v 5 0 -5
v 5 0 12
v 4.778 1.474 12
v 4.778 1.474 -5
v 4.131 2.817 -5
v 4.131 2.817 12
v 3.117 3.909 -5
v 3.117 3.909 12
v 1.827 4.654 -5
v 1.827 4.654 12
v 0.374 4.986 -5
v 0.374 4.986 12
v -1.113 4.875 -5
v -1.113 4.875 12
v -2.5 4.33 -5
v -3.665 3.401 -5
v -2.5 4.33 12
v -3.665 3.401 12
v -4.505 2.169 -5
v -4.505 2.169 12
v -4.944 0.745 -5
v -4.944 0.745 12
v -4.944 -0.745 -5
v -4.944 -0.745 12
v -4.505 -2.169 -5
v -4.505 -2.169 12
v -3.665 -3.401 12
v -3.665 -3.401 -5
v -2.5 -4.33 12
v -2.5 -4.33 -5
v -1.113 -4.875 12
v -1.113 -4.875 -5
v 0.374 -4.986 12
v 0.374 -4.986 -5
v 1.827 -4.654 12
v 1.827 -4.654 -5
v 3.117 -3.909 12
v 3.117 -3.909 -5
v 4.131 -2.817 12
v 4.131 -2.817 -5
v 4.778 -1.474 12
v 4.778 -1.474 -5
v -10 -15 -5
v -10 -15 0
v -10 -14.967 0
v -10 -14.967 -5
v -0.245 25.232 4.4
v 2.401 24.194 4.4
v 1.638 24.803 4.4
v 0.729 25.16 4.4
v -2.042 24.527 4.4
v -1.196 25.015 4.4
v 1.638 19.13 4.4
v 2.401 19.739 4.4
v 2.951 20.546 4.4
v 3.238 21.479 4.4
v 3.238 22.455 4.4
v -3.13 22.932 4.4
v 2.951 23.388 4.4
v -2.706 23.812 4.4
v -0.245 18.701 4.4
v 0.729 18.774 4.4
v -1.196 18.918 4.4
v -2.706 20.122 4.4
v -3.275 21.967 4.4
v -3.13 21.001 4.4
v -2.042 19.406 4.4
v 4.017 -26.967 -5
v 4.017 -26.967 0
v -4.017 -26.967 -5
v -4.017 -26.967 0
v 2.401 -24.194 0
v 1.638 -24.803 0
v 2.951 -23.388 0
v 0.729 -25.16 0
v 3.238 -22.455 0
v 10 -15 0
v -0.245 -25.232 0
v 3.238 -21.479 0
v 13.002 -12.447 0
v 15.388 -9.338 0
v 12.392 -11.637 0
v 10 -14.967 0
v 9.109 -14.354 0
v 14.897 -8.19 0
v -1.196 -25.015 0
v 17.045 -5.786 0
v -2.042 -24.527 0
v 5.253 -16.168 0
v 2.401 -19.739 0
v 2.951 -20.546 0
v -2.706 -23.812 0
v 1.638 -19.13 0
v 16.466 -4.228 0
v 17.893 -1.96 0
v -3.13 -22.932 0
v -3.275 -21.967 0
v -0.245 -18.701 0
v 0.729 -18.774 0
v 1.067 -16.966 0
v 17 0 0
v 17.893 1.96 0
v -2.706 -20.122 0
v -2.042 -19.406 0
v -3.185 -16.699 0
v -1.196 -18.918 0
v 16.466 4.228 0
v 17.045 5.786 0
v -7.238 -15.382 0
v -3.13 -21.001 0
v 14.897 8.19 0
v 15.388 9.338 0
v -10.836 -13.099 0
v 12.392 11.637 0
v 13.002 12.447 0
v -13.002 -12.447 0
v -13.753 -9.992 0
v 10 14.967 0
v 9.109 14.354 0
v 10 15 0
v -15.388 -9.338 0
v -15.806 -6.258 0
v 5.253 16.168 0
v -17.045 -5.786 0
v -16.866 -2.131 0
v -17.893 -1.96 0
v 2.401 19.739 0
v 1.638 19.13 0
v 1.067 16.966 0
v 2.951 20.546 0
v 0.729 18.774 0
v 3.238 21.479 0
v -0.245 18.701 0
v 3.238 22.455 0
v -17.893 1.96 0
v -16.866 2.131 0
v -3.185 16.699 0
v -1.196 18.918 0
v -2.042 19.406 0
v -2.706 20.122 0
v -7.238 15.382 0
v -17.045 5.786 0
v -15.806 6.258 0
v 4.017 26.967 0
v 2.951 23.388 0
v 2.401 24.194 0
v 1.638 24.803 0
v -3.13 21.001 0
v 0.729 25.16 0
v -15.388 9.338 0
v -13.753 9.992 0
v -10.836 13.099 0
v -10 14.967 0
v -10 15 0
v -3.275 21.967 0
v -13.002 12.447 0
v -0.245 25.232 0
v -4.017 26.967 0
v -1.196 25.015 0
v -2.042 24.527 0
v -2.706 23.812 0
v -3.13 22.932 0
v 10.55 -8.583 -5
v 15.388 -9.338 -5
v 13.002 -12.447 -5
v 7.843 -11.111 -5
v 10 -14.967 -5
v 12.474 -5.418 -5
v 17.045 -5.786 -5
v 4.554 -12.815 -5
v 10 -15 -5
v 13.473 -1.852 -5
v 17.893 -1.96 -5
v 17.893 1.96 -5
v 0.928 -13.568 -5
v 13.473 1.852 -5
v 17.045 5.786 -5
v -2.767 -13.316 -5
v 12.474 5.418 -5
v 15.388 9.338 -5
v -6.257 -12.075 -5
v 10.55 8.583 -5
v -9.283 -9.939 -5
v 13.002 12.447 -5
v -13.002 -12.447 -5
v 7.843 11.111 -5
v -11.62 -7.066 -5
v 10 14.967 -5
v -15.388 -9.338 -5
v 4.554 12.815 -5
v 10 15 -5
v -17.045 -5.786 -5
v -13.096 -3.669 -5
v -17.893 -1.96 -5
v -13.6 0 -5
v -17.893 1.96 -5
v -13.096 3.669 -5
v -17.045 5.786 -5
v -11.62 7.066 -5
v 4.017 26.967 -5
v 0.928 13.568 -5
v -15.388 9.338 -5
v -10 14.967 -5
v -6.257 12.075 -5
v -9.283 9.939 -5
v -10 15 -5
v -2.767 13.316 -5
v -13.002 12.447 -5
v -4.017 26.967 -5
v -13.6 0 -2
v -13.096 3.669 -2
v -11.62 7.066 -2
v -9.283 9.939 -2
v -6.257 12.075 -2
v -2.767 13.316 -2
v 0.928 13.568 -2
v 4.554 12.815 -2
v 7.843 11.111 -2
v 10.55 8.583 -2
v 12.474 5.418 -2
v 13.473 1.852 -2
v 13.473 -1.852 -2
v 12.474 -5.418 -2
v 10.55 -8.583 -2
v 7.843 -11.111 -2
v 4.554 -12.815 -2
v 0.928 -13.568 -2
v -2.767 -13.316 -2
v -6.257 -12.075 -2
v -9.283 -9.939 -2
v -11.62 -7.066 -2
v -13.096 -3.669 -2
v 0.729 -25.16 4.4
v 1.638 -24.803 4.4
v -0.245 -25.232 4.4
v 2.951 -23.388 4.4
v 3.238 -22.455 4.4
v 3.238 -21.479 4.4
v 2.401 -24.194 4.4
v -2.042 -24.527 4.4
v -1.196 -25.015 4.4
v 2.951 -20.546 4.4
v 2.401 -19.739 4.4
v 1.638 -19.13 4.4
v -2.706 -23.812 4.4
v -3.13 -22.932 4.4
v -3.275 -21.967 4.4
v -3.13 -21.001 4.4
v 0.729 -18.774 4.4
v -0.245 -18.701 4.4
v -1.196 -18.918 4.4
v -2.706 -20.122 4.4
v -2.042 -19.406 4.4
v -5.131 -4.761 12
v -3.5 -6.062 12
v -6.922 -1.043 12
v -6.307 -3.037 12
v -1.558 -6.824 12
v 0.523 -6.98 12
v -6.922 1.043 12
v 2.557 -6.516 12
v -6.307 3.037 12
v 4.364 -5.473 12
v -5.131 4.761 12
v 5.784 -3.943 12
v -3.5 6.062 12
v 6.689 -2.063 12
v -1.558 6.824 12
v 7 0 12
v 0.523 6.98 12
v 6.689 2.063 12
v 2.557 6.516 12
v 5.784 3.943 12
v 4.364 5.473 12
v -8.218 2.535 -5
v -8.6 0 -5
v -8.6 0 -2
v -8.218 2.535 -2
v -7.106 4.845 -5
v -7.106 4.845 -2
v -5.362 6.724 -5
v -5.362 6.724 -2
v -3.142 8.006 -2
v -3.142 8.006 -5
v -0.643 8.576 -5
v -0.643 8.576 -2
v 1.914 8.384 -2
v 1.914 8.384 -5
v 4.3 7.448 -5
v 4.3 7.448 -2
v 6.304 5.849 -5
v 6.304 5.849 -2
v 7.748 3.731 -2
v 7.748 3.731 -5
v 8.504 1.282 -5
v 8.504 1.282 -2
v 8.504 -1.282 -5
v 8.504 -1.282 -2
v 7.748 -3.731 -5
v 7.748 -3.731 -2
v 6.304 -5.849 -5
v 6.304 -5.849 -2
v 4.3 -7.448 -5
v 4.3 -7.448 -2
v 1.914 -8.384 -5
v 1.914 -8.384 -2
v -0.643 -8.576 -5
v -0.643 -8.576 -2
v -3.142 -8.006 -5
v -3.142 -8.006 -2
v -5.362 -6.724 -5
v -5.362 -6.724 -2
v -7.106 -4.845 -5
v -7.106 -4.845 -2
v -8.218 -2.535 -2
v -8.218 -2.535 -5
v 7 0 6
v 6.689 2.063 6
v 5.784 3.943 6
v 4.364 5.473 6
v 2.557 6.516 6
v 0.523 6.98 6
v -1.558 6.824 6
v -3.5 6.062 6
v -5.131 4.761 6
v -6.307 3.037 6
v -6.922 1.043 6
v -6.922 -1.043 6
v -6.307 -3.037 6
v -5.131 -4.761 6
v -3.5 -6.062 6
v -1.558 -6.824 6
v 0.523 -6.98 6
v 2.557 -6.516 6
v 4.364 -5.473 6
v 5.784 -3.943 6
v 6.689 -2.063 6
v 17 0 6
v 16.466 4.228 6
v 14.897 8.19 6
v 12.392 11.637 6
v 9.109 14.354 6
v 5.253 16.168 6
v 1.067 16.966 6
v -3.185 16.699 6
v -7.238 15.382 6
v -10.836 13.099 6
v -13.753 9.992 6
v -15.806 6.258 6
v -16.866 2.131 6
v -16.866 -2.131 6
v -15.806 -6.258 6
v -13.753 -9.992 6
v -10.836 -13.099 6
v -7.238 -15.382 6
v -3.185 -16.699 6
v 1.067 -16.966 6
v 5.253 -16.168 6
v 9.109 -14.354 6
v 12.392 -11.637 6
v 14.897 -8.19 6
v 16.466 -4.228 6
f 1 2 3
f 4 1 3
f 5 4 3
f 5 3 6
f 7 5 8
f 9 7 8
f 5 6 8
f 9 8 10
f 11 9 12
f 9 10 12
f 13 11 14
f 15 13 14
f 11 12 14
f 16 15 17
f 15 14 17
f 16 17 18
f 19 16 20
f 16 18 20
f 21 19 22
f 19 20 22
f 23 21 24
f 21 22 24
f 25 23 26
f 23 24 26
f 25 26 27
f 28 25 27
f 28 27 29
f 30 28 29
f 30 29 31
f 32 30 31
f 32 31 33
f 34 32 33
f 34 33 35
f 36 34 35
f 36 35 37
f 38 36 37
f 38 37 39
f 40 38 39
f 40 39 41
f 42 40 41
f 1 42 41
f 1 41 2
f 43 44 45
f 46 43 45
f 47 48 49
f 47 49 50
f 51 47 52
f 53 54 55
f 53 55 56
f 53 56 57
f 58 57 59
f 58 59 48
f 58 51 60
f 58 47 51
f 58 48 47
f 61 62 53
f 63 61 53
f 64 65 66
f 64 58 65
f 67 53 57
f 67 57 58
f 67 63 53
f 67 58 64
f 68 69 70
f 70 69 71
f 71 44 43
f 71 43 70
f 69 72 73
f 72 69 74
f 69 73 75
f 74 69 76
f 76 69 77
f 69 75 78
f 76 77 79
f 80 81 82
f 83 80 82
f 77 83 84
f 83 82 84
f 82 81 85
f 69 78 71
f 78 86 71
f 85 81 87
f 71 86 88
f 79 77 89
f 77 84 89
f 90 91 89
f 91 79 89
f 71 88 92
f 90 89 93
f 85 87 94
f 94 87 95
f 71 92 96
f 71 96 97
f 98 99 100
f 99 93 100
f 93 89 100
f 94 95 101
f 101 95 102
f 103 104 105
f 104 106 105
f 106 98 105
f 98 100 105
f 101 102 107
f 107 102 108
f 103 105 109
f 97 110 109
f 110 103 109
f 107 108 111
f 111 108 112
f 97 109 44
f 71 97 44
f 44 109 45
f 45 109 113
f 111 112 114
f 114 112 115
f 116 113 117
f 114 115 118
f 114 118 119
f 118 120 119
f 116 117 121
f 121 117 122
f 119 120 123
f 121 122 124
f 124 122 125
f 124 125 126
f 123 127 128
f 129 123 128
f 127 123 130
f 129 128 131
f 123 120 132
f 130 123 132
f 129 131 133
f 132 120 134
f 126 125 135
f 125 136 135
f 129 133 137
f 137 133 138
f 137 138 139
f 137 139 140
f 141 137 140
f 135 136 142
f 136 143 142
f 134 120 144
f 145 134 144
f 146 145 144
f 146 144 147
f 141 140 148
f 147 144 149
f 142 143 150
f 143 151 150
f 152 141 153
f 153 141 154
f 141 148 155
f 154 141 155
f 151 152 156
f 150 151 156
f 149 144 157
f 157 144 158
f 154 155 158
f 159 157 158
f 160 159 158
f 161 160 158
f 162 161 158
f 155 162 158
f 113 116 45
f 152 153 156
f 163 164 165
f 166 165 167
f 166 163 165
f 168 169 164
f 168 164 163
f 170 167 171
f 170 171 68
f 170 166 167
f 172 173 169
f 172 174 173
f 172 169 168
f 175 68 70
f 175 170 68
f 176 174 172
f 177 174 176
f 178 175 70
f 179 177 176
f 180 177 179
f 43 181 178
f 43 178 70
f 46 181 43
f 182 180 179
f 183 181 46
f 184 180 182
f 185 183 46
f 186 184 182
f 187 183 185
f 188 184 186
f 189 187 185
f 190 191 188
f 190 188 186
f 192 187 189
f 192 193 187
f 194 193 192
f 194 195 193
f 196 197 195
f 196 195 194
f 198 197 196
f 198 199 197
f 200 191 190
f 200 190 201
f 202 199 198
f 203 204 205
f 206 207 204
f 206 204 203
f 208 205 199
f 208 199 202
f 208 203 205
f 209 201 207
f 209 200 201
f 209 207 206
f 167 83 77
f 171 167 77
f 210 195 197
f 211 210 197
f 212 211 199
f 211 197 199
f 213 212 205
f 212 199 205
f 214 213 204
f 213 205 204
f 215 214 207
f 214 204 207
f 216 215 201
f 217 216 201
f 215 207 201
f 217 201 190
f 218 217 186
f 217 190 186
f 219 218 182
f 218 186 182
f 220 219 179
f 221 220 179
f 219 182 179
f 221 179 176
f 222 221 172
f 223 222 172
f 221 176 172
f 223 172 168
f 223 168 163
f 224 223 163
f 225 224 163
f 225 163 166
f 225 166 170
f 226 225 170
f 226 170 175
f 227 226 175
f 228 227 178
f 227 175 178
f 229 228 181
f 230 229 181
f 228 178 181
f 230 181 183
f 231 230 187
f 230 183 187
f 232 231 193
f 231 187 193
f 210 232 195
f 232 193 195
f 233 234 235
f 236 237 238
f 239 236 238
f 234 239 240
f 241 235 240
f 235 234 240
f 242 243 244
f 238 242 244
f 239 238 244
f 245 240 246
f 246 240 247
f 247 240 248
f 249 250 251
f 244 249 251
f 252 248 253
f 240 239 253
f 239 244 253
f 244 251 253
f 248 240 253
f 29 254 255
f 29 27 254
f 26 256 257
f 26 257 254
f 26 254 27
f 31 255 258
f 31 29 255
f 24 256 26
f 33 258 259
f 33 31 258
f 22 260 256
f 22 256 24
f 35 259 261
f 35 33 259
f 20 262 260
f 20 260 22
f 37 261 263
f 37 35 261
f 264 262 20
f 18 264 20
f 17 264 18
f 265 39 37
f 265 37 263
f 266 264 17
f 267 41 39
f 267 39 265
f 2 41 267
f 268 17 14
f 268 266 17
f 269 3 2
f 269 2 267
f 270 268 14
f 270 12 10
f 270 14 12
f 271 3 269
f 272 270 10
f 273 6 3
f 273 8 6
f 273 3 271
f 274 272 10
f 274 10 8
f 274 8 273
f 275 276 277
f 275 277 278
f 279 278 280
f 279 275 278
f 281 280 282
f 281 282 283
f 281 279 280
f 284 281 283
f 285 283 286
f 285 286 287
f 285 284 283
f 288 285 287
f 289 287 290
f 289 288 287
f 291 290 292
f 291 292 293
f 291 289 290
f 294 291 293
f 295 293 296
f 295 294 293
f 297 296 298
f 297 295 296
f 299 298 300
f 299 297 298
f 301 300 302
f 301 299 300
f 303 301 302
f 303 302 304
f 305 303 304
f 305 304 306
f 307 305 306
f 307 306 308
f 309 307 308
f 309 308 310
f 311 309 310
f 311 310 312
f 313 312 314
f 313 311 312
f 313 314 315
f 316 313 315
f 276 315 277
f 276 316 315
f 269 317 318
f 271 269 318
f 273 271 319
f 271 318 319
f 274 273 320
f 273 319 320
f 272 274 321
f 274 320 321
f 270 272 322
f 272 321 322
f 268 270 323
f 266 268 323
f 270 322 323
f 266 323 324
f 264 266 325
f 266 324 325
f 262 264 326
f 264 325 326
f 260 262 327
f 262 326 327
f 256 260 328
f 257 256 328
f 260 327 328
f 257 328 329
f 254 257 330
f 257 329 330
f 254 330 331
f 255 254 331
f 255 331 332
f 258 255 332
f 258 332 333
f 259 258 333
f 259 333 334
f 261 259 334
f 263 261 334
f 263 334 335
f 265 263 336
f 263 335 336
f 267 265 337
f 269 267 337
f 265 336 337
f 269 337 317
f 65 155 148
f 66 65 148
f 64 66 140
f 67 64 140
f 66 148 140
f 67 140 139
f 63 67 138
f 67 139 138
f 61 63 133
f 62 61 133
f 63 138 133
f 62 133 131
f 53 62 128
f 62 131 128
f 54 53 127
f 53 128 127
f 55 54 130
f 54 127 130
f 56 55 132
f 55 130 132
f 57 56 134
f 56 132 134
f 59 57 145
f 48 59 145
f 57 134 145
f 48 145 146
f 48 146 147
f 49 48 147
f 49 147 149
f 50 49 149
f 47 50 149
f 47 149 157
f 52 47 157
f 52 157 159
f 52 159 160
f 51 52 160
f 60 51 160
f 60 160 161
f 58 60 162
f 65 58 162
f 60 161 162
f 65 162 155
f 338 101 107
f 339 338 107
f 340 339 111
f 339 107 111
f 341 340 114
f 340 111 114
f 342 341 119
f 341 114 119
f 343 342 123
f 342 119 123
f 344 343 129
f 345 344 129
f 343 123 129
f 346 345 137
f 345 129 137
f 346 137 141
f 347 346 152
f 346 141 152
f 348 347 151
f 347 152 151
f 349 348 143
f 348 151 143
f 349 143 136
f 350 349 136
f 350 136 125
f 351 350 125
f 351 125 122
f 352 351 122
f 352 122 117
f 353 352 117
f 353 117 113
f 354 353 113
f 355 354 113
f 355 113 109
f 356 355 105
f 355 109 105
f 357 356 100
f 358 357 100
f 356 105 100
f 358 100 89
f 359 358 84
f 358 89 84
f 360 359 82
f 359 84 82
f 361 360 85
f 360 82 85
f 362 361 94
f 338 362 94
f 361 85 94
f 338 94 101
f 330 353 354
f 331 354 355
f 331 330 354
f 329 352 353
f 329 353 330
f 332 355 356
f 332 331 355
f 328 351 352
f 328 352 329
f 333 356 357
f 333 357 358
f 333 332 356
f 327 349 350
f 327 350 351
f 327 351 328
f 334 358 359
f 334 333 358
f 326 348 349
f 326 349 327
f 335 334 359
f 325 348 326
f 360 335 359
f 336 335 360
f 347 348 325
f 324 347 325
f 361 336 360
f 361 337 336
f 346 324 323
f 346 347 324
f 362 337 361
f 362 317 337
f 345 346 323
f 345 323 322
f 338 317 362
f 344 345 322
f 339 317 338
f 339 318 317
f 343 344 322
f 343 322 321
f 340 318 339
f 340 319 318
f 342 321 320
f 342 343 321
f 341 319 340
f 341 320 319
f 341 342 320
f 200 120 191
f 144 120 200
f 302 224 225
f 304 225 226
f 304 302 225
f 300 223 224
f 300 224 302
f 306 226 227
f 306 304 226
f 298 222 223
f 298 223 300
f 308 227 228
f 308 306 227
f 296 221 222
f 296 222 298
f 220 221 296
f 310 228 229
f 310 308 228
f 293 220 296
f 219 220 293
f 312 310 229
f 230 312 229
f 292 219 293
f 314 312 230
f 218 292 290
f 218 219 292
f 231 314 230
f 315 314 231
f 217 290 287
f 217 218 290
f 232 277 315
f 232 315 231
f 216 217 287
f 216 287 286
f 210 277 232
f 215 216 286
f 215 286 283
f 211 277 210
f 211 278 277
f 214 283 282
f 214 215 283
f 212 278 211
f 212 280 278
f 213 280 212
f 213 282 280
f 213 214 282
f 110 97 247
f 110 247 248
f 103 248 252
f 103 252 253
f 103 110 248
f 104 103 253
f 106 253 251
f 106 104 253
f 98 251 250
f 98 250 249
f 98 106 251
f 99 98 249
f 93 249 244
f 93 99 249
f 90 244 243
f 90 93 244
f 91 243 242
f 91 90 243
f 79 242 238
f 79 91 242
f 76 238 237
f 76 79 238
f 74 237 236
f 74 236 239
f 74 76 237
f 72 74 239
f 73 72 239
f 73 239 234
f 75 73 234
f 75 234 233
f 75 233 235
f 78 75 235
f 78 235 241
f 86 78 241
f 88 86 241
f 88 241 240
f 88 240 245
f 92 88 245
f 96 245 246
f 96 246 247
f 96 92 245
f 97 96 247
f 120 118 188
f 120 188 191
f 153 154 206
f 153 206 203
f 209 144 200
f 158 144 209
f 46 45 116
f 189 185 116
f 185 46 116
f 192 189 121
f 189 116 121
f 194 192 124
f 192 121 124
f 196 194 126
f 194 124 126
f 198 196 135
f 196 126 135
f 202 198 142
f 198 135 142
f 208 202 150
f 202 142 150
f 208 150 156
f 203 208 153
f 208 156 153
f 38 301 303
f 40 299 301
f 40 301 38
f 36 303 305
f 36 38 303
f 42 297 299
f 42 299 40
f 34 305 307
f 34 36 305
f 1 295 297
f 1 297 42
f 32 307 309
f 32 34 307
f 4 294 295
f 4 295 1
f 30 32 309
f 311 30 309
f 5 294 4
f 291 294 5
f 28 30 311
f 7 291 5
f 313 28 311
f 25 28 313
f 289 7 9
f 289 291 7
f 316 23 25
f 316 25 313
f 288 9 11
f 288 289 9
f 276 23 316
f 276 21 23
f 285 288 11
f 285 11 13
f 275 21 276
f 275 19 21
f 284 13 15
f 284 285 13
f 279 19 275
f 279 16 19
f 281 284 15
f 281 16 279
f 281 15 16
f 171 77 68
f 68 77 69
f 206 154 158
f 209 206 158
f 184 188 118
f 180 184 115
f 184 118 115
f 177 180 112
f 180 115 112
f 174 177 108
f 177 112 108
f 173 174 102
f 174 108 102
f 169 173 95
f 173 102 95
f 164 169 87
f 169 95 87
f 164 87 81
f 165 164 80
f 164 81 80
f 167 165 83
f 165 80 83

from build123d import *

# Parameters (mm, degrees)
SKETCH_1_R          = 17
EXTRUDE_1_DEPTH     = 6
SKETCH_2_R          = 7
EXTRUDE_2_DEPTH     = 6
SKETCH_3_R          = 18
EXTRUDE_3_DEPTH     = 5
EXTRUDE_START       = -5
EXTRUDE_6_DEPTH     = 5
CUT_EXTRUDE_1_DEPTH = 8
SKETCH_6_R          = 3.275
EXTRUDE_5_DEPTH     = 4.4
SKETCH_9_R          = 5
CUT_EXTRUDE_3_DEPTH = 37.608729958
SKETCH_10_R         = 13.6
SKETCH_10_R_2       = 8.6
CUT_EXTRUDE_4_DEPTH = 3


with BuildPart() as part:
    # 스케치1 → 보스-돌출1 (new body)
    with BuildSketch(Plane.XY):
        Circle(SKETCH_1_R)
    extrude(amount=EXTRUDE_1_DEPTH)

    # 스케치2 → 보스-돌출2 (add)
    with BuildSketch(Plane.XY.offset(6)):
        Circle(SKETCH_2_R)
    extrude(amount=EXTRUDE_2_DEPTH)

    # 스케치3 → 보스-돌출3 (add)
    with BuildSketch(Plane(origin=(0, 0, 0), x_dir=(-1, 0, 0), z_dir=(0, 0, -1))):
        Circle(SKETCH_3_R)
    extrude(amount=EXTRUDE_3_DEPTH)

    # 스케치8 → 보스-돌출6 (add)
    with BuildSketch(Plane(origin=(0, 0, -5), x_dir=(-1, 0, 0), z_dir=(0, 0, -1)).offset(EXTRUDE_START)):
        with BuildLine():
            Line((-10, 14.966629547), (-10, 26.966629547))
            Line((-10, 26.966629547), (10, 26.966629547))
            Line((10, 26.966629547), (10, 14.966629547))
            ThreePointArc((10, 14.966629547), (0, 18), (-10, 14.966629547))
        make_face()
    extrude_6 = extrude(amount=EXTRUDE_6_DEPTH)

    # 스케치5 → 컷-돌출1 (cut)
    with BuildSketch(Plane.XY):
        Polygon((-10, 27), (-10, 15), (-4, 27), align=None)
        Polygon((4, 27), (10, 27), (10, 15), align=None)
    cut_extrude_1 = extrude(amount=-CUT_EXTRUDE_1_DEPTH, mode=Mode.SUBTRACT)

    # 스케치6 → 보스-돌출5 (add)
    with BuildSketch(Plane.XY):
        with Locations(Location((0, 21.966629547, 0), (0, 0, 180))):
            Circle(SKETCH_6_R)
    extrude_5 = extrude(amount=EXTRUDE_5_DEPTH)

    # 대칭 복사6: 보스-돌출6, 컷-돌출1, 보스-돌출5 across plane
    add(extrude_6.mirror(Plane.ZX))
    add(cut_extrude_1.mirror(Plane.ZX), mode=Mode.SUBTRACT)
    add(extrude_5.mirror(Plane.ZX))

    # 스케치9 → 컷-돌출3 (cut, through all)
    with BuildSketch(Plane.XY.offset(12)):
        Circle(SKETCH_9_R)
    extrude(amount=-CUT_EXTRUDE_3_DEPTH, mode=Mode.SUBTRACT)

    # 스케치10 → 컷-돌출4 (cut)
    with BuildSketch(Plane(origin=(0, 0, -5), x_dir=(-1, 0, 0), z_dir=(0, 0, -1))):
        Circle(SKETCH_10_R)
        Circle(SKETCH_10_R_2, mode=Mode.SUBTRACT)
    extrude(amount=-CUT_EXTRUDE_4_DEPTH, mode=Mode.SUBTRACT)


solid = part.part
